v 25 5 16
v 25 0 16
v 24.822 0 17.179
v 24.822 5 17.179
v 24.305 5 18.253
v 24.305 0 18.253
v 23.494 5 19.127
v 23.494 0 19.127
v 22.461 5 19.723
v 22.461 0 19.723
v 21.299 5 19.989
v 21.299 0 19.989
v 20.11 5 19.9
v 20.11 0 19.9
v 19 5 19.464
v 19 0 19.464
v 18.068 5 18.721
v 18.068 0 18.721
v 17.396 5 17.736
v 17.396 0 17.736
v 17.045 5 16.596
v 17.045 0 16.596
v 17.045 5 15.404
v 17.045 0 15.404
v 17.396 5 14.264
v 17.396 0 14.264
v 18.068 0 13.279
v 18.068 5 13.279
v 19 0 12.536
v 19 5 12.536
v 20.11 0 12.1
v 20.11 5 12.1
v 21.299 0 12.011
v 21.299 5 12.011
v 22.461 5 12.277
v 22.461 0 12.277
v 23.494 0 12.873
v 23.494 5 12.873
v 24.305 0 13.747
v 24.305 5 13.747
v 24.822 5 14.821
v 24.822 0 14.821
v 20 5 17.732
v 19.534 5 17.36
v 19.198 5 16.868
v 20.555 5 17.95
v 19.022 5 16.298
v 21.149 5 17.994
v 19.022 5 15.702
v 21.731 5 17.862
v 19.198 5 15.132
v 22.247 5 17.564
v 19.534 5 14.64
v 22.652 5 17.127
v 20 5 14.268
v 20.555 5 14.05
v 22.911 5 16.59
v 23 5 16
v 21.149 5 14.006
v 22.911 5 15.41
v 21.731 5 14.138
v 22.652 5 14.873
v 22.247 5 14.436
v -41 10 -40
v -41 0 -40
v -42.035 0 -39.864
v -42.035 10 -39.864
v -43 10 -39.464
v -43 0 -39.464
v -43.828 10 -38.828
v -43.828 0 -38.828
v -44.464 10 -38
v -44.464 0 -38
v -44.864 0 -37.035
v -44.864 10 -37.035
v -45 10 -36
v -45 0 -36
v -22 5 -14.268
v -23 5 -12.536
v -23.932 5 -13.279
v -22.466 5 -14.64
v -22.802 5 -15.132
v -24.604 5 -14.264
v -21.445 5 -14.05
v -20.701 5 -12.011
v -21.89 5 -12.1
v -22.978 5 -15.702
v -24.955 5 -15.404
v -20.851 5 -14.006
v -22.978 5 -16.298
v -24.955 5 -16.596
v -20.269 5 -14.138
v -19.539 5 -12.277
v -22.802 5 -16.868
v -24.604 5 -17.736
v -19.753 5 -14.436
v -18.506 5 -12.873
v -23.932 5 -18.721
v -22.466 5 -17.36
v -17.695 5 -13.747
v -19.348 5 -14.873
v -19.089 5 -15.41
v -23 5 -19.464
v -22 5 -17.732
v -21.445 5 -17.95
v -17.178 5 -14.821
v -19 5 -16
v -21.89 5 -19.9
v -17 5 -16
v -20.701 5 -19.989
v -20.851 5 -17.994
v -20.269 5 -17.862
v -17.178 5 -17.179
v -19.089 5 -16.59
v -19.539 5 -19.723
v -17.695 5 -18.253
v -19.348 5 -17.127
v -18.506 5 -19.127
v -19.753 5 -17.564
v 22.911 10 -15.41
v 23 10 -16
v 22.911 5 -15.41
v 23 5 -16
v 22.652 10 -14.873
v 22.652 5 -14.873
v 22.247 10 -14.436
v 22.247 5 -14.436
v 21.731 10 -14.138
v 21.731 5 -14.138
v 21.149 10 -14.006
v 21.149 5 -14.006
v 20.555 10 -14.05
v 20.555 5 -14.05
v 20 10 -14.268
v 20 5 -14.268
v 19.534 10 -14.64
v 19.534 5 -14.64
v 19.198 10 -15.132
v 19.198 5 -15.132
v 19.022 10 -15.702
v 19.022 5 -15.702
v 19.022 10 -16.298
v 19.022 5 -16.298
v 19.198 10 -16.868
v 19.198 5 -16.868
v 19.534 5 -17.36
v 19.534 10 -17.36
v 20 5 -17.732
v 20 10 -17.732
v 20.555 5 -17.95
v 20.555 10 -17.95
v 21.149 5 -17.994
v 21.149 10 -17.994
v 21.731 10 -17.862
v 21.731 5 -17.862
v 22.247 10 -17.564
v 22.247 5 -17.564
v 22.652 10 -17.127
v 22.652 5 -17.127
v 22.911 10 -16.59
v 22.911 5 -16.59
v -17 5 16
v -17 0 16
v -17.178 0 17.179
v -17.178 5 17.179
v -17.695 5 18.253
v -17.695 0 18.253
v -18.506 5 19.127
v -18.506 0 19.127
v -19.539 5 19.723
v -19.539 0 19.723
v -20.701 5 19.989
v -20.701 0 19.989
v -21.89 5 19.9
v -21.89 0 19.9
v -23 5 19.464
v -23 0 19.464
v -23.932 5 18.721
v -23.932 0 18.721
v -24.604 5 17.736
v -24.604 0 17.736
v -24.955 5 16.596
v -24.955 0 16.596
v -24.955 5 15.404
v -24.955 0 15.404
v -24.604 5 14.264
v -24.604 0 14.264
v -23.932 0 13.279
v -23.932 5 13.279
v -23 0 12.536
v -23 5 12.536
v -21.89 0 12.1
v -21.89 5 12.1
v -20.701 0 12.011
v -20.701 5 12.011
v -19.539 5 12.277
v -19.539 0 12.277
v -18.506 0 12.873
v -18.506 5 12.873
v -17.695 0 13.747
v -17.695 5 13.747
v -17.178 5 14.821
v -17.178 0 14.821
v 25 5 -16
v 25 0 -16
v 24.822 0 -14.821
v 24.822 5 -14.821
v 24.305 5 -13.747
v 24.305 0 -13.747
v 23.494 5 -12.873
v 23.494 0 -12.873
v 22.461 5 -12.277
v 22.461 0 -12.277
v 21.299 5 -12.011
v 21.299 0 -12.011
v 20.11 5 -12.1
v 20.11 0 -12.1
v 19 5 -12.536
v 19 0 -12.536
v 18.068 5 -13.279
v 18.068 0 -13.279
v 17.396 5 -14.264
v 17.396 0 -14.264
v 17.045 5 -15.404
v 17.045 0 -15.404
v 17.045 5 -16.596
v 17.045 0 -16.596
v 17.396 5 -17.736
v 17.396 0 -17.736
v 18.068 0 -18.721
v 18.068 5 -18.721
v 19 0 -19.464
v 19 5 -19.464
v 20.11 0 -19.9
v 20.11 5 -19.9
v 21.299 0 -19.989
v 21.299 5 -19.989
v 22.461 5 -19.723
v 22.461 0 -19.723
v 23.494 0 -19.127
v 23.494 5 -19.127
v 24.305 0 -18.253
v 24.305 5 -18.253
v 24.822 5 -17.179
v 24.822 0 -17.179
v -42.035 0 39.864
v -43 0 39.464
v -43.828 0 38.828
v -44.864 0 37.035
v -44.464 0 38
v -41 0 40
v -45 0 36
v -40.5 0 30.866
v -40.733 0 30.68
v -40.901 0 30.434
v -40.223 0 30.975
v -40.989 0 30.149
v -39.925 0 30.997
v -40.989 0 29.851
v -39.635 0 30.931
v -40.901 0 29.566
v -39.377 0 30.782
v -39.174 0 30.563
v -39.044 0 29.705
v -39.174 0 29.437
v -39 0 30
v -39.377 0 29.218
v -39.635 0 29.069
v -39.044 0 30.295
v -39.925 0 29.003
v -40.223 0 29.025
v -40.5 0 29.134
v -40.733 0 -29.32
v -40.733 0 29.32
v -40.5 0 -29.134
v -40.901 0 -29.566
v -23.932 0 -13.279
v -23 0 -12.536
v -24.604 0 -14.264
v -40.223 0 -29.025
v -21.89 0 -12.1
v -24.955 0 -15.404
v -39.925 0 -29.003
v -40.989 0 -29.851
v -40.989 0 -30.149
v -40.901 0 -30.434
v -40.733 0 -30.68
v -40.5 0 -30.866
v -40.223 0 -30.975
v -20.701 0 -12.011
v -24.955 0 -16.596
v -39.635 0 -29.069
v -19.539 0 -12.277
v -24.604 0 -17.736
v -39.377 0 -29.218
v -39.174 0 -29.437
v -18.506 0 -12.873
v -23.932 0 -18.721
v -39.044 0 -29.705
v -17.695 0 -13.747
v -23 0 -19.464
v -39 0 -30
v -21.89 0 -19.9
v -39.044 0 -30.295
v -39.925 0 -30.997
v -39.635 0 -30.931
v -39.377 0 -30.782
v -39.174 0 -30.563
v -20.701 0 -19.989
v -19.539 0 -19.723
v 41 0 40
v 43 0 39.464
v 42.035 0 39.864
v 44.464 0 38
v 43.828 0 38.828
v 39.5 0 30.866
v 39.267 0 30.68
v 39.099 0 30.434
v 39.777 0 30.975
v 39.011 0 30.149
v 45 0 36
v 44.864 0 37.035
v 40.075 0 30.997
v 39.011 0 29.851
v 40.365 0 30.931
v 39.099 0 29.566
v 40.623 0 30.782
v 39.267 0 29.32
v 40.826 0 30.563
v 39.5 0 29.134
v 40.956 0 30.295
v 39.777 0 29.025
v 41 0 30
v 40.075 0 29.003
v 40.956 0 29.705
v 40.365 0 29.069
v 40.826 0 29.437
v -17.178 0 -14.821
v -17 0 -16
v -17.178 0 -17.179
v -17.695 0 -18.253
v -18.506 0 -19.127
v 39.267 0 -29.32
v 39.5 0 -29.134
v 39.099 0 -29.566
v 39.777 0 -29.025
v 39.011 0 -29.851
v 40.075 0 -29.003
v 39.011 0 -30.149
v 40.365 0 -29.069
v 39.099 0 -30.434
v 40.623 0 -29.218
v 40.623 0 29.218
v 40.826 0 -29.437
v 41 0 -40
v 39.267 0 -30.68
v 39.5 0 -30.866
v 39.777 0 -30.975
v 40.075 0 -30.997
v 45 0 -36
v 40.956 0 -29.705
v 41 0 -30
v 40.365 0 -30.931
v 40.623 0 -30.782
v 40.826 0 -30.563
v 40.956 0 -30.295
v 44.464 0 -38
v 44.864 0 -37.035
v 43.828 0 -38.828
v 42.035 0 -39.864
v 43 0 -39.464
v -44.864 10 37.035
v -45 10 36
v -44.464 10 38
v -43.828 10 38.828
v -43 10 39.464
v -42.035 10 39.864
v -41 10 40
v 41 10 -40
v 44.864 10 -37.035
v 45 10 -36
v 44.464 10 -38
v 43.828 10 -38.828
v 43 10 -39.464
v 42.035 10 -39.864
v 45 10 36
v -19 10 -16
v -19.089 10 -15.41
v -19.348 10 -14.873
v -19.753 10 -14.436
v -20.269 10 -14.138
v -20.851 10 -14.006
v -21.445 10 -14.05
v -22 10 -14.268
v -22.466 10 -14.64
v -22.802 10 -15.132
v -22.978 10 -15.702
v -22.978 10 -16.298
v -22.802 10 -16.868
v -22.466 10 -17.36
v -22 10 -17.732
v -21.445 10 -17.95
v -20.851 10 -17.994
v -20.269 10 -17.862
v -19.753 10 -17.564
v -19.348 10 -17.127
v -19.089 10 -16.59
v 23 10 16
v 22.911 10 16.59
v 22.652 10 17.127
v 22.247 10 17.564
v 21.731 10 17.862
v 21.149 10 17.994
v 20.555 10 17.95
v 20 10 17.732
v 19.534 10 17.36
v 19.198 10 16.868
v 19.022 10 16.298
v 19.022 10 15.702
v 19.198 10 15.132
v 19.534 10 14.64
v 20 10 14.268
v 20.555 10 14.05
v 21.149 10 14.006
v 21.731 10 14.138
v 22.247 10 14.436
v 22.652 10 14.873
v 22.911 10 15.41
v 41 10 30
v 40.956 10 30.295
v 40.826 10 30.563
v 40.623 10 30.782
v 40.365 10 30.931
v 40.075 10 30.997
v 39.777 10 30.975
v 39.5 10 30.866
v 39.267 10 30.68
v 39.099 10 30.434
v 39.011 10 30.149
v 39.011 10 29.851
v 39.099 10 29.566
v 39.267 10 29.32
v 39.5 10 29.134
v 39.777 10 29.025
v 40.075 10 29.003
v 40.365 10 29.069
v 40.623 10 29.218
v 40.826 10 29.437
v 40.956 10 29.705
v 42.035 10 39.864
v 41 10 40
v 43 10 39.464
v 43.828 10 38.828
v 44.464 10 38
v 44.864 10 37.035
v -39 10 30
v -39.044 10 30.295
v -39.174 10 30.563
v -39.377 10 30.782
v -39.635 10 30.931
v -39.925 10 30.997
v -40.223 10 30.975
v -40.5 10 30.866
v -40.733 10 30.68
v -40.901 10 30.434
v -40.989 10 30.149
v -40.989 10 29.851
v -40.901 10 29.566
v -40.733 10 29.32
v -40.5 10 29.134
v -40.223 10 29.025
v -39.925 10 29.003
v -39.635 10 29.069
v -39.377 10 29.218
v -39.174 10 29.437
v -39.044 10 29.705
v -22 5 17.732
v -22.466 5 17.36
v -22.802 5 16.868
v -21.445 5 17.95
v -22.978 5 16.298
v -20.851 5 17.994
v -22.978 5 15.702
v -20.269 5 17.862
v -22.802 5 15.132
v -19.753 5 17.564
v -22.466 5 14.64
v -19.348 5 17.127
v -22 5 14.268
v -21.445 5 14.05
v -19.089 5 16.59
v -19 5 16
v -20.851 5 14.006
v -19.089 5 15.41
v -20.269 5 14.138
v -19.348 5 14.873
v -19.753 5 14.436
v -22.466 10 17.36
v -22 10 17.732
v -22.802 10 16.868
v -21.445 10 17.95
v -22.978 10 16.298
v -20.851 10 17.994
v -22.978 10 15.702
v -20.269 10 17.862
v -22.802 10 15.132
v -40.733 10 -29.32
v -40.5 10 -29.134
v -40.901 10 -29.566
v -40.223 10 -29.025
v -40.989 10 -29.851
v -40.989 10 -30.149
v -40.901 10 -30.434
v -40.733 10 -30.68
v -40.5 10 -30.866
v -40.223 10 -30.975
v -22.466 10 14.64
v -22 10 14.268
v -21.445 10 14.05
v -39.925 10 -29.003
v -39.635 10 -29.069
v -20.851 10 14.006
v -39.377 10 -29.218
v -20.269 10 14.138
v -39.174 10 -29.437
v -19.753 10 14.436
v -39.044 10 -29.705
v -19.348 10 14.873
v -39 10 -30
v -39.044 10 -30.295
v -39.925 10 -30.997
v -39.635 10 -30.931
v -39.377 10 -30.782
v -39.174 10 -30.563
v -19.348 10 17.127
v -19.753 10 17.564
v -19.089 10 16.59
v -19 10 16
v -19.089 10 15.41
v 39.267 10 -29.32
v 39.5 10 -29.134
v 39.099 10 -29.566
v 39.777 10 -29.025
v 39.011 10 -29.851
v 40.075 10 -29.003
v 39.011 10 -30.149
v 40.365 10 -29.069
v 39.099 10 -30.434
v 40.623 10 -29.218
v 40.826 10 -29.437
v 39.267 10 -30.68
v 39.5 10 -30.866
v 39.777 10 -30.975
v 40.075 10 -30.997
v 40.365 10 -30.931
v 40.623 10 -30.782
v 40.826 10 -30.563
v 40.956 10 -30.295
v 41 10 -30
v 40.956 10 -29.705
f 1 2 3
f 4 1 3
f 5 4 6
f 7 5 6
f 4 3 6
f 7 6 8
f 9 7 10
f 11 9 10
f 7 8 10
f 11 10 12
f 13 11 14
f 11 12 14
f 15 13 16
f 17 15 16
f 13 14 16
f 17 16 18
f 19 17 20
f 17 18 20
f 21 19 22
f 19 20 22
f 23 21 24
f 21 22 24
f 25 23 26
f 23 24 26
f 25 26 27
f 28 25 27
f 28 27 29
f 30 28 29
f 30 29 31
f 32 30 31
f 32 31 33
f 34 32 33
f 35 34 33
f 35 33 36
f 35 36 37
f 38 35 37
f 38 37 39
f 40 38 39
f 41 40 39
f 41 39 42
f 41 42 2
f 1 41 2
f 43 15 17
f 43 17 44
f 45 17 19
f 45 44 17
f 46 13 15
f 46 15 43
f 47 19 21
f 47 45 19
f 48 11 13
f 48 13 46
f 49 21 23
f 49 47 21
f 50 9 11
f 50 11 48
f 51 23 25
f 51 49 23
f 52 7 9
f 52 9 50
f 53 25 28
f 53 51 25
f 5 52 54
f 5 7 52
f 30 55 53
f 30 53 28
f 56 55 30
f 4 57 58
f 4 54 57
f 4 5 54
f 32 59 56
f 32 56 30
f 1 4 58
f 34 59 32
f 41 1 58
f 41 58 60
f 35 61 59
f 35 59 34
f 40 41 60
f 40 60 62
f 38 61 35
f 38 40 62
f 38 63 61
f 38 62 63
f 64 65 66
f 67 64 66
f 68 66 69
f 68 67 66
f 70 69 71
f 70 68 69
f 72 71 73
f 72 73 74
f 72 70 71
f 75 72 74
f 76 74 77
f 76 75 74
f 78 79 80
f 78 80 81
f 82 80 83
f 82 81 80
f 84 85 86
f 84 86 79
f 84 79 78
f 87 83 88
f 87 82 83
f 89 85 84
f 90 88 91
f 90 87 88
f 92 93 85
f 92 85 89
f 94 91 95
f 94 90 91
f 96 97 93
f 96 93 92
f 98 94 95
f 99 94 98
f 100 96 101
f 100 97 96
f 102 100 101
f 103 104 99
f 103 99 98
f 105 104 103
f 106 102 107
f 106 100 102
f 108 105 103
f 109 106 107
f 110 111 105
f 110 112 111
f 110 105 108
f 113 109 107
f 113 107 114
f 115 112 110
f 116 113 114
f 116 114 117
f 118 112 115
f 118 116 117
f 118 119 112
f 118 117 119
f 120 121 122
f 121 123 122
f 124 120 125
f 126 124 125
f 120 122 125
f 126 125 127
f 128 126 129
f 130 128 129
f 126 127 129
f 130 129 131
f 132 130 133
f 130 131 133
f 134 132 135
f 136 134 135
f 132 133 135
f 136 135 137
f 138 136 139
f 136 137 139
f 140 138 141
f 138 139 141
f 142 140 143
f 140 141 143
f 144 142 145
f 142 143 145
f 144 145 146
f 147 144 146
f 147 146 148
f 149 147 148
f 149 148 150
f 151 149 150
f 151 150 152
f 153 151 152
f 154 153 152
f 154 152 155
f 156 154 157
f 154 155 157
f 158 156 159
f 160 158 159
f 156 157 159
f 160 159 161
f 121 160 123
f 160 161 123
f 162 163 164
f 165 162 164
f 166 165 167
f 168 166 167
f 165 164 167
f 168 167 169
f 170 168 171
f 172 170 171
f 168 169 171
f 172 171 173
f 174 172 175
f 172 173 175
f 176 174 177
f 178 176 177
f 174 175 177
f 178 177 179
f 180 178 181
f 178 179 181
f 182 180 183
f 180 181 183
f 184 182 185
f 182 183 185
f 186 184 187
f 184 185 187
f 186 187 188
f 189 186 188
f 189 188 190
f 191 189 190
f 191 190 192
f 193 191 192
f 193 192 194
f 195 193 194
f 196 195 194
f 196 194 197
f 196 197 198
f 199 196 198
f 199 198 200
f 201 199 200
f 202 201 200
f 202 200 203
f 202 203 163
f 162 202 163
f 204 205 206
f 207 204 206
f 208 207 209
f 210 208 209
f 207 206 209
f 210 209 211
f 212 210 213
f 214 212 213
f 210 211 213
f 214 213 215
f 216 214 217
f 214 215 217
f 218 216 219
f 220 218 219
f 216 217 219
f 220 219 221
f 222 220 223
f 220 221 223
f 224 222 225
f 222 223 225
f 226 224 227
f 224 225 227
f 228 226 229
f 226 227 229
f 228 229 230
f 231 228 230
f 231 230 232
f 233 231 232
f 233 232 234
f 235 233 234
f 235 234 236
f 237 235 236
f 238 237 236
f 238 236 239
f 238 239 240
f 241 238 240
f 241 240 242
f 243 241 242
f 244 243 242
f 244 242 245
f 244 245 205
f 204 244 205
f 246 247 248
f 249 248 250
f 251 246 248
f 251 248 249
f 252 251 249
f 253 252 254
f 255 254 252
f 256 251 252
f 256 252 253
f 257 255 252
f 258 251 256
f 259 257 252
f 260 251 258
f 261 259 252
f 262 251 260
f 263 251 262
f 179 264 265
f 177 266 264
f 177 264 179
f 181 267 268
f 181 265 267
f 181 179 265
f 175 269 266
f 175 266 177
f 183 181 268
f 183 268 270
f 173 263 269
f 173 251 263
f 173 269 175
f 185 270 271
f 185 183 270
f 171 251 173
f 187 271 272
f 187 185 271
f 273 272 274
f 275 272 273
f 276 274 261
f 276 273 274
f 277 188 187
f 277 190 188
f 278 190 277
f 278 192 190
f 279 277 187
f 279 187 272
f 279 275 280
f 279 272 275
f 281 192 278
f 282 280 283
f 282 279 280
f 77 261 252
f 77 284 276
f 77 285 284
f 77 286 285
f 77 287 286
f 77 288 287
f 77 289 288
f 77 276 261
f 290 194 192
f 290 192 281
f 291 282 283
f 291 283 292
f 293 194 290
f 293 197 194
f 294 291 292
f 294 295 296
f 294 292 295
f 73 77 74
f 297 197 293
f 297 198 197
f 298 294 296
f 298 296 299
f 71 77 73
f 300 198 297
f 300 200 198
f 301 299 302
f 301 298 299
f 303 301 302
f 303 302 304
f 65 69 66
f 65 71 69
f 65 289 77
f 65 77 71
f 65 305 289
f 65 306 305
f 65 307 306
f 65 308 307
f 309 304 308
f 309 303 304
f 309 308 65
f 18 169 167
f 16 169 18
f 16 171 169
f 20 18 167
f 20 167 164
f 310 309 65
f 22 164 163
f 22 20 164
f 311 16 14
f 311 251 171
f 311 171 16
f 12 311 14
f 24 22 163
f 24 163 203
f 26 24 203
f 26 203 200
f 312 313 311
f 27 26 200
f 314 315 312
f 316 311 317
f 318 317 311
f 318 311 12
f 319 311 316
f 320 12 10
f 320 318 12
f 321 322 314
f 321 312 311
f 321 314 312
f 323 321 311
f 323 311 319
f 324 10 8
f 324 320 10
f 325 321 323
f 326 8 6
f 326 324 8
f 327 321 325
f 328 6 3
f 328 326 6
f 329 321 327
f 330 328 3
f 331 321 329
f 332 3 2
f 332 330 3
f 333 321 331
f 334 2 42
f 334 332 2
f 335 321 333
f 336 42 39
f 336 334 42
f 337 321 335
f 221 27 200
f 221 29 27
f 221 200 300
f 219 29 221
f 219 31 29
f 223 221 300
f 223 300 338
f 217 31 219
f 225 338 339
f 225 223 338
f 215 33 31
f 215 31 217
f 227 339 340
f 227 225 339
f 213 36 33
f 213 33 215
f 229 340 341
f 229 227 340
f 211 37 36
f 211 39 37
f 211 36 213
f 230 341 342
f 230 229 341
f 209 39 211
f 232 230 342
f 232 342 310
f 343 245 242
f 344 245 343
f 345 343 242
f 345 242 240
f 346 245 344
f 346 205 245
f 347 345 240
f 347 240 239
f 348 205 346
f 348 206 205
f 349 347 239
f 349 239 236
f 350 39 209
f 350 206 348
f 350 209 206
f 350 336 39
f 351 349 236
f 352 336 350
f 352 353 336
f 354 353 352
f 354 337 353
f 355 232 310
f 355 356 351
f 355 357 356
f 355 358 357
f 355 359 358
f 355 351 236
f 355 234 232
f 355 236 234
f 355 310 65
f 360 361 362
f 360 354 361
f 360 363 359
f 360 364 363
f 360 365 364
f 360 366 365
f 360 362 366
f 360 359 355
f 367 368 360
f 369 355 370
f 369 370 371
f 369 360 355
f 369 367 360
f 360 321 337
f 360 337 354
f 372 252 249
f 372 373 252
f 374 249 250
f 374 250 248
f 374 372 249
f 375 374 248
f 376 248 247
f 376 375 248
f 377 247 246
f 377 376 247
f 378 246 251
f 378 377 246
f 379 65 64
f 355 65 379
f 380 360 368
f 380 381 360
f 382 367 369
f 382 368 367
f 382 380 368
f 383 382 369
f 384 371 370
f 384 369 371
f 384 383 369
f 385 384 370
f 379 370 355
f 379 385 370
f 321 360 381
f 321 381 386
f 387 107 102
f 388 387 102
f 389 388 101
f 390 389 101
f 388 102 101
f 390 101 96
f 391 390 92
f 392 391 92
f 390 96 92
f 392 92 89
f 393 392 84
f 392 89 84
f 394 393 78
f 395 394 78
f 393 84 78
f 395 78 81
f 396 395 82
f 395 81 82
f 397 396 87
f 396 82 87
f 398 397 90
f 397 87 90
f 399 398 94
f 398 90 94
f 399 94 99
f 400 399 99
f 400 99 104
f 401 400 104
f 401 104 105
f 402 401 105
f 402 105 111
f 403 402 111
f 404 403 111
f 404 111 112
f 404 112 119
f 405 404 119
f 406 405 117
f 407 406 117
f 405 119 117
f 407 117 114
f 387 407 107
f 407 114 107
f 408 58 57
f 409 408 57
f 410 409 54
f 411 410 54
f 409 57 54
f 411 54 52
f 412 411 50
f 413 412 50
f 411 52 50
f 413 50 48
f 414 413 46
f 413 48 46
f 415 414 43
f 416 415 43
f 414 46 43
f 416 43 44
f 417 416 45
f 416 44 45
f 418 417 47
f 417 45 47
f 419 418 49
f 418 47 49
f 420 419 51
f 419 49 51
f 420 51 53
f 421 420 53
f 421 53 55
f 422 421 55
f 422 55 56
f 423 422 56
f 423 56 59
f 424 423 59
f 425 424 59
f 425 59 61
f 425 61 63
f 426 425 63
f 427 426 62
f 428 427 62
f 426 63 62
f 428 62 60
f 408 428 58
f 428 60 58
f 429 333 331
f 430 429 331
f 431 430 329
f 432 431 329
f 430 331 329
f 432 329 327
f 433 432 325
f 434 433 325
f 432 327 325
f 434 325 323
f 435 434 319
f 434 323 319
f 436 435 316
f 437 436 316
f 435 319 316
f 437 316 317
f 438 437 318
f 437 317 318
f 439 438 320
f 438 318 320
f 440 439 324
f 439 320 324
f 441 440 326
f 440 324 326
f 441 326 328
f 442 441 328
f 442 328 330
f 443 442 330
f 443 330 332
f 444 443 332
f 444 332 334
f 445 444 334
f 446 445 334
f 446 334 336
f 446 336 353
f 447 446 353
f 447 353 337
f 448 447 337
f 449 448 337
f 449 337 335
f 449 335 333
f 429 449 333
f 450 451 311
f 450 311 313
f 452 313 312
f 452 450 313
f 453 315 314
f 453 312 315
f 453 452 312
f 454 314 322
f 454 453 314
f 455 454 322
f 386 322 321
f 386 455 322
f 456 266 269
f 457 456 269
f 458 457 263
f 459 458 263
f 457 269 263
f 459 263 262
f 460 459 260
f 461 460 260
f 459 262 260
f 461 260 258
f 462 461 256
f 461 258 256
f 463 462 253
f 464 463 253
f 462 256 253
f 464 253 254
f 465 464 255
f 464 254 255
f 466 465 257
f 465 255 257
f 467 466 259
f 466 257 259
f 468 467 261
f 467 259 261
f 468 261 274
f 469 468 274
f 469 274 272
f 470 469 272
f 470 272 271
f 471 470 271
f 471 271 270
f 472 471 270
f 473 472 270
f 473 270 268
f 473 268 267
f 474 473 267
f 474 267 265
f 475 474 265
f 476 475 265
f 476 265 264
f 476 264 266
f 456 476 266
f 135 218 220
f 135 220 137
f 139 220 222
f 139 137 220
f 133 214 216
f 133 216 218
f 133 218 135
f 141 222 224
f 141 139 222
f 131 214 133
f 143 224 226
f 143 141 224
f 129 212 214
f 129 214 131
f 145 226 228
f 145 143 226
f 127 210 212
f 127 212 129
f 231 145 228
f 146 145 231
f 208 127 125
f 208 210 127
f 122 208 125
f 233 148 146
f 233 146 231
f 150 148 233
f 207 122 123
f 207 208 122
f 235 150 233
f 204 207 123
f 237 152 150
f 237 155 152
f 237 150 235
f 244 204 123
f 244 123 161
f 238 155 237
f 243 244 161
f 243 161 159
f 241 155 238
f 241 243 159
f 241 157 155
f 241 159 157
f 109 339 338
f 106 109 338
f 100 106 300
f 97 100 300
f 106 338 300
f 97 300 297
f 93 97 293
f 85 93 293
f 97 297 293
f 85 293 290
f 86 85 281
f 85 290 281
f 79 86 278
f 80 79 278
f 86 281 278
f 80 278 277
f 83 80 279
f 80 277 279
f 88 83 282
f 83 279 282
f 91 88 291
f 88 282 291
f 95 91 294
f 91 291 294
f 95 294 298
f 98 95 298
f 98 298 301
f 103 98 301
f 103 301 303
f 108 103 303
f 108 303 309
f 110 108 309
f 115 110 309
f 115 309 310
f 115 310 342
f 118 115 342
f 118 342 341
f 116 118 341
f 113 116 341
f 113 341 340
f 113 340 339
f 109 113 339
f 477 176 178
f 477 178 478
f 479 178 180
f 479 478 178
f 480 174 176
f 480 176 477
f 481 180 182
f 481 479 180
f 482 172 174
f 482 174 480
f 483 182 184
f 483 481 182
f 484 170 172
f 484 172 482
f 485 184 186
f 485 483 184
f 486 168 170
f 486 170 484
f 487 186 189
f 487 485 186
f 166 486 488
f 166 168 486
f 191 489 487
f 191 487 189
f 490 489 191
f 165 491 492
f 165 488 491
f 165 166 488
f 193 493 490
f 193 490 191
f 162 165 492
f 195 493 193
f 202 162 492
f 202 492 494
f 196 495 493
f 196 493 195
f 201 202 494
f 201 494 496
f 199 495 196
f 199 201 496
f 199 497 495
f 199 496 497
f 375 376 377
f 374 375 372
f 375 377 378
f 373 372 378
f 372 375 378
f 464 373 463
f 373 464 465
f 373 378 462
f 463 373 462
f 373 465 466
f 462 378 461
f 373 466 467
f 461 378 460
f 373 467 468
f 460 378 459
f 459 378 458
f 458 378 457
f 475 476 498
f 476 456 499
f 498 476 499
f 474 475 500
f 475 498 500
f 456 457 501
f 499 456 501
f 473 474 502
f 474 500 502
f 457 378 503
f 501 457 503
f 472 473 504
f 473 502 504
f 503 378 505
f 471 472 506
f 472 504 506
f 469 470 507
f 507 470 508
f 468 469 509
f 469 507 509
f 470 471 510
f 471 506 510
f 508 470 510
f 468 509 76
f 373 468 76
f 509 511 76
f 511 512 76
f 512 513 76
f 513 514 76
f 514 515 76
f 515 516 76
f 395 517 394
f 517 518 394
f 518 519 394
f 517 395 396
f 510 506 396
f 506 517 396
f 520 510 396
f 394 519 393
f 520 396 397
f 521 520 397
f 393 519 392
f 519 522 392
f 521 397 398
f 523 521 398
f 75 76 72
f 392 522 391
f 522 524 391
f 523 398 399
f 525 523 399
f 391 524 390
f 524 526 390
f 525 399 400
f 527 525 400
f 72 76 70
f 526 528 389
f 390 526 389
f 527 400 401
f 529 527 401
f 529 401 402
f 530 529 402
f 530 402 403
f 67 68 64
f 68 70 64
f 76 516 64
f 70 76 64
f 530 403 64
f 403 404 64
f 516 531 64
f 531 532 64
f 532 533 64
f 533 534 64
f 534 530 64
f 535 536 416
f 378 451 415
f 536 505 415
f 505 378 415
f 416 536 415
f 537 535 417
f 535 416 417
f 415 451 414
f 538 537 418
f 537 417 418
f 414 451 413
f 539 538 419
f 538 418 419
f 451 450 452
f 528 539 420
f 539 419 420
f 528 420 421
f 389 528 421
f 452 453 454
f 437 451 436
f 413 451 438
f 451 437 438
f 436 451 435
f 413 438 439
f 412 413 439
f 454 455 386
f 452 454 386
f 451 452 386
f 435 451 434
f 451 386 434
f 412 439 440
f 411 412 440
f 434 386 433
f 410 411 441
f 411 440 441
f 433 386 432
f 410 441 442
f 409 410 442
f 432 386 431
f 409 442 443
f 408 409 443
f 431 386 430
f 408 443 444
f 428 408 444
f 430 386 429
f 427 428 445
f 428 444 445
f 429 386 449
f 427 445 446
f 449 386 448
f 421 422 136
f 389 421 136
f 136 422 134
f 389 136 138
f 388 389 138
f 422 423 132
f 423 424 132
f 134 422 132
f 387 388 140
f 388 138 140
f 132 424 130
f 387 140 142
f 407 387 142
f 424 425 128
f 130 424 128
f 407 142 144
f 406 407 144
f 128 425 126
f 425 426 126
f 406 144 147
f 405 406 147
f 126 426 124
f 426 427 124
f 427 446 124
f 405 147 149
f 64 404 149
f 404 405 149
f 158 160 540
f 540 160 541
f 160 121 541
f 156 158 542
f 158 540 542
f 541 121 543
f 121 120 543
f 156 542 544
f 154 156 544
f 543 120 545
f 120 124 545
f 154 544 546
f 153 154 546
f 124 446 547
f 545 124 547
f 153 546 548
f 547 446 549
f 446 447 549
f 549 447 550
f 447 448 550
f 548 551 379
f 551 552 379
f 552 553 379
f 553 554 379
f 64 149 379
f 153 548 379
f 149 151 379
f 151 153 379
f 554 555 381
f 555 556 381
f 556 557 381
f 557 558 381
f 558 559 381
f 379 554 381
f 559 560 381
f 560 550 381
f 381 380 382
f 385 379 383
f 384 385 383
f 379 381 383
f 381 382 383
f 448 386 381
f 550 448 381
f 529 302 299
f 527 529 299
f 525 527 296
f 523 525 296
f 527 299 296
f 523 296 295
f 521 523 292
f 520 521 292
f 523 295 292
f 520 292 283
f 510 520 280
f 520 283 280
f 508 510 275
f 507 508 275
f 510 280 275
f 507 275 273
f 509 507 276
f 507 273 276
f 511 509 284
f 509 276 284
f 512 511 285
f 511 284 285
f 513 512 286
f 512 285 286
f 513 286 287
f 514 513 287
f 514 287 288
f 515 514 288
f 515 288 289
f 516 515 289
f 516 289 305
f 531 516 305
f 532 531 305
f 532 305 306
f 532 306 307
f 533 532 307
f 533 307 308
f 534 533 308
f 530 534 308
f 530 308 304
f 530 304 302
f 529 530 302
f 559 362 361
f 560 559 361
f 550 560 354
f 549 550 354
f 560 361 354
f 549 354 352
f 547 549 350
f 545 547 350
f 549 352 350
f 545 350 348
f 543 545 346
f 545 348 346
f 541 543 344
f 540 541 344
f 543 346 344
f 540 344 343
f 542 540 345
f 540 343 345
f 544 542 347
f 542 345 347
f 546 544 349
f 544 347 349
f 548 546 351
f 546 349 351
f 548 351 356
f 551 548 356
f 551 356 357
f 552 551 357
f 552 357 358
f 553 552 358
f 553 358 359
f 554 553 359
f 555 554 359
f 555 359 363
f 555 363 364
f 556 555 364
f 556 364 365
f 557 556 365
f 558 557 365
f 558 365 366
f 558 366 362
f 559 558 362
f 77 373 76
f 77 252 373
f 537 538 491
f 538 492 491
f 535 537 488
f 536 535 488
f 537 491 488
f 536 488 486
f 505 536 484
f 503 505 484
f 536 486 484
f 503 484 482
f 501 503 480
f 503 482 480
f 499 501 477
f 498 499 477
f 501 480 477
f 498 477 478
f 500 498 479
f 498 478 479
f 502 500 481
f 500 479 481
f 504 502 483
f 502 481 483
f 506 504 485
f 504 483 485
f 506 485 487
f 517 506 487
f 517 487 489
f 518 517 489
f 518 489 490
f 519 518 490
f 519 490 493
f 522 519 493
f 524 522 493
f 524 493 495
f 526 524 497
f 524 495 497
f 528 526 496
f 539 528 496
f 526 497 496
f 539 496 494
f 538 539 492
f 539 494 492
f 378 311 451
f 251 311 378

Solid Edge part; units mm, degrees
sketch "Sketch1" plane through (0, 0, 0) normal (0, -1, 0) x (1, 0, 0)
  line L0 (-45, -40) -> (45, -40)
  line L1 (45, -40) -> (45, 40)
  line L2 (45, 40) -> (-45, 40)
  line L3 (-45, 40) -> (-45, -40)
  dimension "D1" = 90
  dimension "D2" = 80
extrude "Protrusion1" add sketch "Sketch1" against normal blind 10
sketch "Sketch2" plane through (0, 0, 0) normal (0, -1, 0) x (1, 0, 0)
  circle A0 centre (-40, 30) radius 1
  circle A1 centre (-40, -30) radius 1
  circle A2 centre (40, -30) radius 1
  circle A3 centre (40, 30) radius 1
  dimension "D1" = 2
  dimension "D2" = 60
  dimension "D3" = 80
extrude "Cutout1" cut sketch "Sketch2" against normal through all
sketch "Sketch3" plane through (0, 0, 0) normal (0, -1, 0) x (1, 0, 0)
  circle A0 centre (-21, 16) radius 4
  circle A1 centre (-21, -16) radius 4
  circle A2 centre (21, -16) radius 4
  circle A3 centre (21, 16) radius 4
extrude "Extrusionsausschnitt_2" cut sketch "Sketch3" against normal blind 5
sketch "Sketch4" plane through (0, 0, 0) normal (0, -1, 0) x (1, 0, 0)
  circle A0 centre (-21, 16) radius 2
  circle A1 centre (-21, -16) radius 2
  circle A2 centre (21, -16) radius 2
  circle A3 centre (21, 16) radius 2
  dimension "D1" = 4
extrude "Cutout2" cut sketch "Sketch4" against normal through all
fillet "Verrundung_1" radius 4 4 edges at (-45, 5, 40) (45, 5, 40) (45, 5, -40) (-45, 5, -40)
properties material "Nylon, allgemein"
